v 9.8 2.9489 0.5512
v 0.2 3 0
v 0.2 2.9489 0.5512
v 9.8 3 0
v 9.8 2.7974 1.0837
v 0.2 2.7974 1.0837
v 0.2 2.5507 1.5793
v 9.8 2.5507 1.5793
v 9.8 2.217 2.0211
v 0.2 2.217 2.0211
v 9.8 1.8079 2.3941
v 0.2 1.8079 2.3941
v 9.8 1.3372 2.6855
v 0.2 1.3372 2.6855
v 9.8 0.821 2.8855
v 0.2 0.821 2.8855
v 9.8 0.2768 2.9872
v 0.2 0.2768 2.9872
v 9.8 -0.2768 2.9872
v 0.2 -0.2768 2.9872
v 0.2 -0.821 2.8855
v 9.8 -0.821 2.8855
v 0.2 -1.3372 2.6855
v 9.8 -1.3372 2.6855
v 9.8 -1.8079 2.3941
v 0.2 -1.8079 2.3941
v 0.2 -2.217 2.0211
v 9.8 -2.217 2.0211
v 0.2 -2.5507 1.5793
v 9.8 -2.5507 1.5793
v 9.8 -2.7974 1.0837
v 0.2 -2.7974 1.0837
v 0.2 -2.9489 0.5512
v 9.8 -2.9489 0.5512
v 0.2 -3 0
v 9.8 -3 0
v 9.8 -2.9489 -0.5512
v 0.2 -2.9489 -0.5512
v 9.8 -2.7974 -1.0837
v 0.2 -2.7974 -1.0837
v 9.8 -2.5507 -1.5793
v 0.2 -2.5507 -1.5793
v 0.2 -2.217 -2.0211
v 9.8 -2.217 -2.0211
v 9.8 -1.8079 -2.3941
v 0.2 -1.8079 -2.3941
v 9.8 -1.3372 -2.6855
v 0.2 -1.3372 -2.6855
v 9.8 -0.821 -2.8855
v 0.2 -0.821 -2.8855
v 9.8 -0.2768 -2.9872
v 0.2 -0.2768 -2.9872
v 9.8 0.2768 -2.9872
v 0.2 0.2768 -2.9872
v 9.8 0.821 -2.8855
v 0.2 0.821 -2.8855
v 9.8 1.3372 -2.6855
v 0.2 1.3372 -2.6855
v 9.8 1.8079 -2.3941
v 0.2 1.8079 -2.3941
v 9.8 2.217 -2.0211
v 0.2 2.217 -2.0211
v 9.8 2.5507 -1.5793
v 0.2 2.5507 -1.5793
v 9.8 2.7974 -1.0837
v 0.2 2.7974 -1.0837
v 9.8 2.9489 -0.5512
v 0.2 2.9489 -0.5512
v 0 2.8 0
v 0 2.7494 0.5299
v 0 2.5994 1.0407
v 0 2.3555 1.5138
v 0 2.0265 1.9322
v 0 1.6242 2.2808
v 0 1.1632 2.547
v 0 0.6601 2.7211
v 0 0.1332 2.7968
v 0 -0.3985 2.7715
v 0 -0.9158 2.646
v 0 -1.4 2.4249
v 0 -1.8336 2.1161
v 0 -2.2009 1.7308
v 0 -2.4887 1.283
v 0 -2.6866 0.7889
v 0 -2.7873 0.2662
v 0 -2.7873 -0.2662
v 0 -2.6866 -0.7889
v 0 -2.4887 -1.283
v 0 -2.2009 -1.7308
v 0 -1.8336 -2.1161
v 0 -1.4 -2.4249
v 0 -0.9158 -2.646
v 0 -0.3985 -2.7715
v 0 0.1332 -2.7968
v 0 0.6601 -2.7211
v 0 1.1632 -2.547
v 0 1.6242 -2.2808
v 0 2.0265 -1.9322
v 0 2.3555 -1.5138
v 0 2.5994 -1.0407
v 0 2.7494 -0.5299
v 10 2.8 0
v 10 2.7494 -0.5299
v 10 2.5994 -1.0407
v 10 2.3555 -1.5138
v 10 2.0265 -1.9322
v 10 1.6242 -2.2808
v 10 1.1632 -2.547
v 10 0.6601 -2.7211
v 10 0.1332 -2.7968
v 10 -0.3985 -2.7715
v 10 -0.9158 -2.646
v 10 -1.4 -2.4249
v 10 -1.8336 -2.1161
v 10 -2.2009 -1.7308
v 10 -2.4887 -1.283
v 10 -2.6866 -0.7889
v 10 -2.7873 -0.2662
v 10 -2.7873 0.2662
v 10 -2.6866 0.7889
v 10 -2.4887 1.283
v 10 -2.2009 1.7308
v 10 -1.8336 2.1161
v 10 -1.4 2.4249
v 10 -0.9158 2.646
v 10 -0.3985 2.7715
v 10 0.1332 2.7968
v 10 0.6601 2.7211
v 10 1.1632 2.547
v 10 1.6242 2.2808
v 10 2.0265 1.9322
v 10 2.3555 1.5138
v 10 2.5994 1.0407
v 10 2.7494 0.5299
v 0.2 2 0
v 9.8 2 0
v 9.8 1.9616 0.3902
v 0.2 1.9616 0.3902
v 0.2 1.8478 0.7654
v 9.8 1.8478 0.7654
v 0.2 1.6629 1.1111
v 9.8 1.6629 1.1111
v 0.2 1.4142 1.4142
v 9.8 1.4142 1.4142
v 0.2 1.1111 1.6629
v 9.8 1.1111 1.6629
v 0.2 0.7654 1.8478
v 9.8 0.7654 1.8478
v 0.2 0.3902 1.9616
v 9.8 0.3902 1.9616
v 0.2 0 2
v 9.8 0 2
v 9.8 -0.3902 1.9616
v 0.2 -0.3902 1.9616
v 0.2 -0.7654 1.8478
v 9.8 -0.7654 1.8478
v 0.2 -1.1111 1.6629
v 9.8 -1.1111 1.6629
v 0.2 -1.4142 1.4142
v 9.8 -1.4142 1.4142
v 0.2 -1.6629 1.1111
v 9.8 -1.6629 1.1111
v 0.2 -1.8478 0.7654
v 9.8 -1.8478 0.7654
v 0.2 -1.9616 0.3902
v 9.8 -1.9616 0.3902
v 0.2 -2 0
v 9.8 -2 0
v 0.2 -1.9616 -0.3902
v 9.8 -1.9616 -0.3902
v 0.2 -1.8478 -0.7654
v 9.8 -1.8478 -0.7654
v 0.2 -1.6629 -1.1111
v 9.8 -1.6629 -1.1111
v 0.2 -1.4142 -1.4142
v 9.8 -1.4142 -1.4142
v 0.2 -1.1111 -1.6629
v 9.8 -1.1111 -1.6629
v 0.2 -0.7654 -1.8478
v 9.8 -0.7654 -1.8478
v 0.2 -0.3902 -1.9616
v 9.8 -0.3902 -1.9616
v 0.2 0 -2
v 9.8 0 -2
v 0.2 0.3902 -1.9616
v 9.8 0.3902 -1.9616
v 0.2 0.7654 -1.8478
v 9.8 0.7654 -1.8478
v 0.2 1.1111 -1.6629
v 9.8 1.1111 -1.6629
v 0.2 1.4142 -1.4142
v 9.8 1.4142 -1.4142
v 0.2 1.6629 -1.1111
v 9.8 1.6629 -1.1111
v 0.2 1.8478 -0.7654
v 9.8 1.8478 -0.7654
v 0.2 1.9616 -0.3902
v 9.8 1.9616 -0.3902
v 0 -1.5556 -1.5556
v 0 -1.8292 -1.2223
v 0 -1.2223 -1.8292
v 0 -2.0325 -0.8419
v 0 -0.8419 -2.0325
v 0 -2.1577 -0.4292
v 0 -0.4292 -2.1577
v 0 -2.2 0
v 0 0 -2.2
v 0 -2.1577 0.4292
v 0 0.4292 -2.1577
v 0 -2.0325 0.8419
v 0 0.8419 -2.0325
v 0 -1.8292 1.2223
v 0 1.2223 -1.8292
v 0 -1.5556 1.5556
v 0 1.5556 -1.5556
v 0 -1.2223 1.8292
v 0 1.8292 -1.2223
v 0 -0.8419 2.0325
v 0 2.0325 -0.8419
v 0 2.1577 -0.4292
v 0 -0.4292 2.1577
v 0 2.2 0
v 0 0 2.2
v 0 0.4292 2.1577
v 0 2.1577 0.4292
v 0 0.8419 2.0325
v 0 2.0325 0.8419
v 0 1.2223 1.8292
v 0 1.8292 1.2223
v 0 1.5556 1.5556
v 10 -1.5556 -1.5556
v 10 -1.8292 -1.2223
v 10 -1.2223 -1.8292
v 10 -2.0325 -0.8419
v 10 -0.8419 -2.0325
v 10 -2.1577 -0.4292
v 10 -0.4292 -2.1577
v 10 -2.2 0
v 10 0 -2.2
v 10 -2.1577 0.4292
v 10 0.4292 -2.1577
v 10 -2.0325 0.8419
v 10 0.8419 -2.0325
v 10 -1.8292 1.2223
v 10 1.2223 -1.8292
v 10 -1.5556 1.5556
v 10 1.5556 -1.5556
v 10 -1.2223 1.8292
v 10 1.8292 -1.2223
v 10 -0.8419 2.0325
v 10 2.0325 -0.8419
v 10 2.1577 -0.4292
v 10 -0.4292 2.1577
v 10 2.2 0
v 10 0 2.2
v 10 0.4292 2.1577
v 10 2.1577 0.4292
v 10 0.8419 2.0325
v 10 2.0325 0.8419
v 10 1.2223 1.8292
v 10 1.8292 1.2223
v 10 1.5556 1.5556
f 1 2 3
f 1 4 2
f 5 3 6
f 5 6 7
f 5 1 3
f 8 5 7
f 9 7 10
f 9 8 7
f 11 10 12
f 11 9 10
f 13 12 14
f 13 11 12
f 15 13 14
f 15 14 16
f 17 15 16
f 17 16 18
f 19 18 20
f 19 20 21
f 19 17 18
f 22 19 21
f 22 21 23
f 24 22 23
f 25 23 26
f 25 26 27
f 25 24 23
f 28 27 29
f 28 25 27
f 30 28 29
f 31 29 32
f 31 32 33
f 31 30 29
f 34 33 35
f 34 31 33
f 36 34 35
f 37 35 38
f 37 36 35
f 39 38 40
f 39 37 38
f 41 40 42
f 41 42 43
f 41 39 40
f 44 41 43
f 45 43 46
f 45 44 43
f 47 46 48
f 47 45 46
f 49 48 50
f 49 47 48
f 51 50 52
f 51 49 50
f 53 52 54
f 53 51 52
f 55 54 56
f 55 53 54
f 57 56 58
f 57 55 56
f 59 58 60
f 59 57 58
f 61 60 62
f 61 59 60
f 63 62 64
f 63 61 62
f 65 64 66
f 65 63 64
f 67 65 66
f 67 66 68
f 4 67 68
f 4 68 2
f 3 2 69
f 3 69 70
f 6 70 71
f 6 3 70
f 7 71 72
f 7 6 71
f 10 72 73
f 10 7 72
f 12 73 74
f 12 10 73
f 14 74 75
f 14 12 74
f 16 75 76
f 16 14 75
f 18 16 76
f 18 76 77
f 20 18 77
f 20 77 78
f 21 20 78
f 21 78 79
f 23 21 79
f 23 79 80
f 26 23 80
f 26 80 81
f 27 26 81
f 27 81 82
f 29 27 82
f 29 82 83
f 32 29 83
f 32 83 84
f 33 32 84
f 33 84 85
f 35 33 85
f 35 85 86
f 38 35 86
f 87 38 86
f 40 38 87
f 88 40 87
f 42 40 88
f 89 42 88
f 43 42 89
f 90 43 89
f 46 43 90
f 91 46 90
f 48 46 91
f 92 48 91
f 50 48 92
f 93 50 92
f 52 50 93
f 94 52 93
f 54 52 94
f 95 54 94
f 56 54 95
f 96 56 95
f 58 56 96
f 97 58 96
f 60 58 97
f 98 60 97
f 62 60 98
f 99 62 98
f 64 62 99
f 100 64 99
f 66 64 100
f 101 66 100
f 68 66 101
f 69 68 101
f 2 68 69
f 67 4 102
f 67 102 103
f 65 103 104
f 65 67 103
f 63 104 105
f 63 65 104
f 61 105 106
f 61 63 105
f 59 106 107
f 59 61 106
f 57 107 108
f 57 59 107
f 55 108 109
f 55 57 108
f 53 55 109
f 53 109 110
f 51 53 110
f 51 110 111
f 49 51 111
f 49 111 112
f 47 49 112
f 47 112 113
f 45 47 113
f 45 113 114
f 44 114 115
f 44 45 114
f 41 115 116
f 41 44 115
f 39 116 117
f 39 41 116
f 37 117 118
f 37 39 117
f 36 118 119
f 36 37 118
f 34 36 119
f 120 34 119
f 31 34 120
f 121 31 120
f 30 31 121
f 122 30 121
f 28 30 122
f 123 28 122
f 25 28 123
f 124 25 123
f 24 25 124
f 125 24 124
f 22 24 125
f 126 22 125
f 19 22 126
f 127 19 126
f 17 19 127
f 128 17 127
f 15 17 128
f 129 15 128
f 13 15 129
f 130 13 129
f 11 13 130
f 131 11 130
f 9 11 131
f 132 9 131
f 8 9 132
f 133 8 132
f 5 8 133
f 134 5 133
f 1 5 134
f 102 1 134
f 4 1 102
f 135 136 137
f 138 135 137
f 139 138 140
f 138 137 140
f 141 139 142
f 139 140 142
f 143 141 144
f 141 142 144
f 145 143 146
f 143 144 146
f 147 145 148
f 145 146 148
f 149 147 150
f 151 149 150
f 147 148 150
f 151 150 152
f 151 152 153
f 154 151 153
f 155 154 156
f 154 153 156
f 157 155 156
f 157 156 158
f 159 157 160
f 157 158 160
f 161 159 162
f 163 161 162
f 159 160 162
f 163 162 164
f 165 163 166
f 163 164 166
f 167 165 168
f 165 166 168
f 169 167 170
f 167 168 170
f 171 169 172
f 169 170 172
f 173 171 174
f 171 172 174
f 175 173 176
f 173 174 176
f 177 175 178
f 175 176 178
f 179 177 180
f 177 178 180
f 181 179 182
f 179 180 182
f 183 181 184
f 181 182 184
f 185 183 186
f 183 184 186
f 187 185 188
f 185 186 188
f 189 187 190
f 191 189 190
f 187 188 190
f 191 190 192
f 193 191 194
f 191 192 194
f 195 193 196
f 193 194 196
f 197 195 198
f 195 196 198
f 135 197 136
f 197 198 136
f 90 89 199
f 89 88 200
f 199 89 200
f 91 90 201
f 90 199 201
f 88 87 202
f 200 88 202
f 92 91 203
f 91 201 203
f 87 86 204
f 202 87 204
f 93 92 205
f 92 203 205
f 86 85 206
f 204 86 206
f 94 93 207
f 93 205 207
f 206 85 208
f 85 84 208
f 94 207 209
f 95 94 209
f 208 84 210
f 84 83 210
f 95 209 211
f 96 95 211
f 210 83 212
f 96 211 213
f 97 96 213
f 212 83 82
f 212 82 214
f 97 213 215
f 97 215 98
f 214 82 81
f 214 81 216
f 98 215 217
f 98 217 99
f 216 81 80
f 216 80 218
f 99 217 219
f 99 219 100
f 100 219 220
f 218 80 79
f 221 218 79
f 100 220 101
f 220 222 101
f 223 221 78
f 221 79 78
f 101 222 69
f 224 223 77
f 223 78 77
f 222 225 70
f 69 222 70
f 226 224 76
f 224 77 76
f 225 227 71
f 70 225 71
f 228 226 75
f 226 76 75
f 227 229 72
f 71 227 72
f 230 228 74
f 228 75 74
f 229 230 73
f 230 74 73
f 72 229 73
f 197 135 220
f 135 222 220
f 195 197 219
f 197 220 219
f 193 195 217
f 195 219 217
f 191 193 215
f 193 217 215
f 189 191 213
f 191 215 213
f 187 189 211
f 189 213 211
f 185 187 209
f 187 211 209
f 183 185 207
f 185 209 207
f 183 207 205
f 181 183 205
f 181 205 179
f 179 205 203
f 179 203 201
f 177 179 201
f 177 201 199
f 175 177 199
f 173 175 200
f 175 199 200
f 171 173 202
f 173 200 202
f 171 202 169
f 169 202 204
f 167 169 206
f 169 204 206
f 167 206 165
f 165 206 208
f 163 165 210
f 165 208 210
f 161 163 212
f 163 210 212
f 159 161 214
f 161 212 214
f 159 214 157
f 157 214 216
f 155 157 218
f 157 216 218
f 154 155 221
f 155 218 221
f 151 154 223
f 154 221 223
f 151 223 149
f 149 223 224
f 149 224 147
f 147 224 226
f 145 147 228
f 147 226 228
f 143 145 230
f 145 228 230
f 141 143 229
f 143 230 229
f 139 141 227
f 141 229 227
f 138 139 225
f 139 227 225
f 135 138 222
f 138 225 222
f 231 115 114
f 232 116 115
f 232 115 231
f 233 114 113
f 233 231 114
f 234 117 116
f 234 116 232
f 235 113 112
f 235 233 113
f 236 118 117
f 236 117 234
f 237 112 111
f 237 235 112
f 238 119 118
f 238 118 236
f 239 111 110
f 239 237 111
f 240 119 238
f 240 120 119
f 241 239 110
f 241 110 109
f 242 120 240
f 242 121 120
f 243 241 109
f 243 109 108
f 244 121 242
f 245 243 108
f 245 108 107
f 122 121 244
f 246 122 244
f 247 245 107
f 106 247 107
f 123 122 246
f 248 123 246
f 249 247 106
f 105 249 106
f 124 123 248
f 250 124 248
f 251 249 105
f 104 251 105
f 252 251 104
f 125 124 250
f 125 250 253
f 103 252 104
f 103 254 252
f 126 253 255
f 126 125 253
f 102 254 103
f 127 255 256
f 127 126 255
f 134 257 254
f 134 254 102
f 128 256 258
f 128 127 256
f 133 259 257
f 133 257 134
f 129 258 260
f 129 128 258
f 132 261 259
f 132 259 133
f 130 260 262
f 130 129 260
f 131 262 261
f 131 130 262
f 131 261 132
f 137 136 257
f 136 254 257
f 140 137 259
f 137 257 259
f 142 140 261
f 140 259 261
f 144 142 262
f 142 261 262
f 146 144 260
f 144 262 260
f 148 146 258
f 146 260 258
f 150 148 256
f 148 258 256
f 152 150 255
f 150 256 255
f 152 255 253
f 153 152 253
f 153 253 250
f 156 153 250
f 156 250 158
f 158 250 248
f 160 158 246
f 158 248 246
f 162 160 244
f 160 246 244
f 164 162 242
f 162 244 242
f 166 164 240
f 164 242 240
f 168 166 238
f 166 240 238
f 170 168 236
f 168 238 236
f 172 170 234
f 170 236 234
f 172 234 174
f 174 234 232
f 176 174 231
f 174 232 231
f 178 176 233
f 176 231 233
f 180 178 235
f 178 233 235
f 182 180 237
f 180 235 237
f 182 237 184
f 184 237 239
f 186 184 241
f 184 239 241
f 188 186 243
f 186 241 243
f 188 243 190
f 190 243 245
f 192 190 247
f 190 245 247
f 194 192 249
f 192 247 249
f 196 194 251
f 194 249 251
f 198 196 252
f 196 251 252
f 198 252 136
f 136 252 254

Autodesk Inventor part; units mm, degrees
ref_plane "YZ Plane" through (0, 0, 0) normal (1, 0, 0) x (0, 1, 0)
ref_plane "XZ Plane" through (0, 0, 0) normal (0, 1, 0) x (-1, 0, 0)
ref_plane "XY Plane" through (0, 0, 0) normal (0, 0, 1) x (1, 0, 0)
sketch "_____1" plane through (0, 0, 0) normal (0, 0, 1) x (1, 0, 0)
  line L0 (10, 0) -> (0, 0)
  line L1 (0, 0) -> (0, 2.8)
  line L2 (0, 2.8) -> (0.2, 3)
  line L3 (0.2, 3) -> (9.8, 3)
  line L4 (9.8, 3) -> (10, 2.8)
  line L5 (10, 2.8) -> (10, 0)
  line L6 (10, 0) -> (0, 0)
revolve "Revolution1" add sketch "_____1" angle 360 about axis through (10, 0, 0) along (1, 0, 0)
sketch "_____2" plane through (0, 0, 0) normal (0, 0, 1) x (1, 0, 0)
  line L0 (20, 0) -> (-20, 0)
  line L1 (0, 0) -> (0, 2.2)
  line L2 (0, 2.2) -> (0.2, 2)
  line L3 (0.2, 2) -> (9.8, 2)
  line L4 (9.8, 2) -> (10, 2.2)
  line L5 (10, 2.2) -> (10, 0)
  line L6 (10, 0) -> (0, 0)
revolve "Revolution2" cut sketch "_____2" angle 360 about axis through (20, 0, 0) along (1, 0, 0)
properties part number "C-KNCLA4-6-10"
